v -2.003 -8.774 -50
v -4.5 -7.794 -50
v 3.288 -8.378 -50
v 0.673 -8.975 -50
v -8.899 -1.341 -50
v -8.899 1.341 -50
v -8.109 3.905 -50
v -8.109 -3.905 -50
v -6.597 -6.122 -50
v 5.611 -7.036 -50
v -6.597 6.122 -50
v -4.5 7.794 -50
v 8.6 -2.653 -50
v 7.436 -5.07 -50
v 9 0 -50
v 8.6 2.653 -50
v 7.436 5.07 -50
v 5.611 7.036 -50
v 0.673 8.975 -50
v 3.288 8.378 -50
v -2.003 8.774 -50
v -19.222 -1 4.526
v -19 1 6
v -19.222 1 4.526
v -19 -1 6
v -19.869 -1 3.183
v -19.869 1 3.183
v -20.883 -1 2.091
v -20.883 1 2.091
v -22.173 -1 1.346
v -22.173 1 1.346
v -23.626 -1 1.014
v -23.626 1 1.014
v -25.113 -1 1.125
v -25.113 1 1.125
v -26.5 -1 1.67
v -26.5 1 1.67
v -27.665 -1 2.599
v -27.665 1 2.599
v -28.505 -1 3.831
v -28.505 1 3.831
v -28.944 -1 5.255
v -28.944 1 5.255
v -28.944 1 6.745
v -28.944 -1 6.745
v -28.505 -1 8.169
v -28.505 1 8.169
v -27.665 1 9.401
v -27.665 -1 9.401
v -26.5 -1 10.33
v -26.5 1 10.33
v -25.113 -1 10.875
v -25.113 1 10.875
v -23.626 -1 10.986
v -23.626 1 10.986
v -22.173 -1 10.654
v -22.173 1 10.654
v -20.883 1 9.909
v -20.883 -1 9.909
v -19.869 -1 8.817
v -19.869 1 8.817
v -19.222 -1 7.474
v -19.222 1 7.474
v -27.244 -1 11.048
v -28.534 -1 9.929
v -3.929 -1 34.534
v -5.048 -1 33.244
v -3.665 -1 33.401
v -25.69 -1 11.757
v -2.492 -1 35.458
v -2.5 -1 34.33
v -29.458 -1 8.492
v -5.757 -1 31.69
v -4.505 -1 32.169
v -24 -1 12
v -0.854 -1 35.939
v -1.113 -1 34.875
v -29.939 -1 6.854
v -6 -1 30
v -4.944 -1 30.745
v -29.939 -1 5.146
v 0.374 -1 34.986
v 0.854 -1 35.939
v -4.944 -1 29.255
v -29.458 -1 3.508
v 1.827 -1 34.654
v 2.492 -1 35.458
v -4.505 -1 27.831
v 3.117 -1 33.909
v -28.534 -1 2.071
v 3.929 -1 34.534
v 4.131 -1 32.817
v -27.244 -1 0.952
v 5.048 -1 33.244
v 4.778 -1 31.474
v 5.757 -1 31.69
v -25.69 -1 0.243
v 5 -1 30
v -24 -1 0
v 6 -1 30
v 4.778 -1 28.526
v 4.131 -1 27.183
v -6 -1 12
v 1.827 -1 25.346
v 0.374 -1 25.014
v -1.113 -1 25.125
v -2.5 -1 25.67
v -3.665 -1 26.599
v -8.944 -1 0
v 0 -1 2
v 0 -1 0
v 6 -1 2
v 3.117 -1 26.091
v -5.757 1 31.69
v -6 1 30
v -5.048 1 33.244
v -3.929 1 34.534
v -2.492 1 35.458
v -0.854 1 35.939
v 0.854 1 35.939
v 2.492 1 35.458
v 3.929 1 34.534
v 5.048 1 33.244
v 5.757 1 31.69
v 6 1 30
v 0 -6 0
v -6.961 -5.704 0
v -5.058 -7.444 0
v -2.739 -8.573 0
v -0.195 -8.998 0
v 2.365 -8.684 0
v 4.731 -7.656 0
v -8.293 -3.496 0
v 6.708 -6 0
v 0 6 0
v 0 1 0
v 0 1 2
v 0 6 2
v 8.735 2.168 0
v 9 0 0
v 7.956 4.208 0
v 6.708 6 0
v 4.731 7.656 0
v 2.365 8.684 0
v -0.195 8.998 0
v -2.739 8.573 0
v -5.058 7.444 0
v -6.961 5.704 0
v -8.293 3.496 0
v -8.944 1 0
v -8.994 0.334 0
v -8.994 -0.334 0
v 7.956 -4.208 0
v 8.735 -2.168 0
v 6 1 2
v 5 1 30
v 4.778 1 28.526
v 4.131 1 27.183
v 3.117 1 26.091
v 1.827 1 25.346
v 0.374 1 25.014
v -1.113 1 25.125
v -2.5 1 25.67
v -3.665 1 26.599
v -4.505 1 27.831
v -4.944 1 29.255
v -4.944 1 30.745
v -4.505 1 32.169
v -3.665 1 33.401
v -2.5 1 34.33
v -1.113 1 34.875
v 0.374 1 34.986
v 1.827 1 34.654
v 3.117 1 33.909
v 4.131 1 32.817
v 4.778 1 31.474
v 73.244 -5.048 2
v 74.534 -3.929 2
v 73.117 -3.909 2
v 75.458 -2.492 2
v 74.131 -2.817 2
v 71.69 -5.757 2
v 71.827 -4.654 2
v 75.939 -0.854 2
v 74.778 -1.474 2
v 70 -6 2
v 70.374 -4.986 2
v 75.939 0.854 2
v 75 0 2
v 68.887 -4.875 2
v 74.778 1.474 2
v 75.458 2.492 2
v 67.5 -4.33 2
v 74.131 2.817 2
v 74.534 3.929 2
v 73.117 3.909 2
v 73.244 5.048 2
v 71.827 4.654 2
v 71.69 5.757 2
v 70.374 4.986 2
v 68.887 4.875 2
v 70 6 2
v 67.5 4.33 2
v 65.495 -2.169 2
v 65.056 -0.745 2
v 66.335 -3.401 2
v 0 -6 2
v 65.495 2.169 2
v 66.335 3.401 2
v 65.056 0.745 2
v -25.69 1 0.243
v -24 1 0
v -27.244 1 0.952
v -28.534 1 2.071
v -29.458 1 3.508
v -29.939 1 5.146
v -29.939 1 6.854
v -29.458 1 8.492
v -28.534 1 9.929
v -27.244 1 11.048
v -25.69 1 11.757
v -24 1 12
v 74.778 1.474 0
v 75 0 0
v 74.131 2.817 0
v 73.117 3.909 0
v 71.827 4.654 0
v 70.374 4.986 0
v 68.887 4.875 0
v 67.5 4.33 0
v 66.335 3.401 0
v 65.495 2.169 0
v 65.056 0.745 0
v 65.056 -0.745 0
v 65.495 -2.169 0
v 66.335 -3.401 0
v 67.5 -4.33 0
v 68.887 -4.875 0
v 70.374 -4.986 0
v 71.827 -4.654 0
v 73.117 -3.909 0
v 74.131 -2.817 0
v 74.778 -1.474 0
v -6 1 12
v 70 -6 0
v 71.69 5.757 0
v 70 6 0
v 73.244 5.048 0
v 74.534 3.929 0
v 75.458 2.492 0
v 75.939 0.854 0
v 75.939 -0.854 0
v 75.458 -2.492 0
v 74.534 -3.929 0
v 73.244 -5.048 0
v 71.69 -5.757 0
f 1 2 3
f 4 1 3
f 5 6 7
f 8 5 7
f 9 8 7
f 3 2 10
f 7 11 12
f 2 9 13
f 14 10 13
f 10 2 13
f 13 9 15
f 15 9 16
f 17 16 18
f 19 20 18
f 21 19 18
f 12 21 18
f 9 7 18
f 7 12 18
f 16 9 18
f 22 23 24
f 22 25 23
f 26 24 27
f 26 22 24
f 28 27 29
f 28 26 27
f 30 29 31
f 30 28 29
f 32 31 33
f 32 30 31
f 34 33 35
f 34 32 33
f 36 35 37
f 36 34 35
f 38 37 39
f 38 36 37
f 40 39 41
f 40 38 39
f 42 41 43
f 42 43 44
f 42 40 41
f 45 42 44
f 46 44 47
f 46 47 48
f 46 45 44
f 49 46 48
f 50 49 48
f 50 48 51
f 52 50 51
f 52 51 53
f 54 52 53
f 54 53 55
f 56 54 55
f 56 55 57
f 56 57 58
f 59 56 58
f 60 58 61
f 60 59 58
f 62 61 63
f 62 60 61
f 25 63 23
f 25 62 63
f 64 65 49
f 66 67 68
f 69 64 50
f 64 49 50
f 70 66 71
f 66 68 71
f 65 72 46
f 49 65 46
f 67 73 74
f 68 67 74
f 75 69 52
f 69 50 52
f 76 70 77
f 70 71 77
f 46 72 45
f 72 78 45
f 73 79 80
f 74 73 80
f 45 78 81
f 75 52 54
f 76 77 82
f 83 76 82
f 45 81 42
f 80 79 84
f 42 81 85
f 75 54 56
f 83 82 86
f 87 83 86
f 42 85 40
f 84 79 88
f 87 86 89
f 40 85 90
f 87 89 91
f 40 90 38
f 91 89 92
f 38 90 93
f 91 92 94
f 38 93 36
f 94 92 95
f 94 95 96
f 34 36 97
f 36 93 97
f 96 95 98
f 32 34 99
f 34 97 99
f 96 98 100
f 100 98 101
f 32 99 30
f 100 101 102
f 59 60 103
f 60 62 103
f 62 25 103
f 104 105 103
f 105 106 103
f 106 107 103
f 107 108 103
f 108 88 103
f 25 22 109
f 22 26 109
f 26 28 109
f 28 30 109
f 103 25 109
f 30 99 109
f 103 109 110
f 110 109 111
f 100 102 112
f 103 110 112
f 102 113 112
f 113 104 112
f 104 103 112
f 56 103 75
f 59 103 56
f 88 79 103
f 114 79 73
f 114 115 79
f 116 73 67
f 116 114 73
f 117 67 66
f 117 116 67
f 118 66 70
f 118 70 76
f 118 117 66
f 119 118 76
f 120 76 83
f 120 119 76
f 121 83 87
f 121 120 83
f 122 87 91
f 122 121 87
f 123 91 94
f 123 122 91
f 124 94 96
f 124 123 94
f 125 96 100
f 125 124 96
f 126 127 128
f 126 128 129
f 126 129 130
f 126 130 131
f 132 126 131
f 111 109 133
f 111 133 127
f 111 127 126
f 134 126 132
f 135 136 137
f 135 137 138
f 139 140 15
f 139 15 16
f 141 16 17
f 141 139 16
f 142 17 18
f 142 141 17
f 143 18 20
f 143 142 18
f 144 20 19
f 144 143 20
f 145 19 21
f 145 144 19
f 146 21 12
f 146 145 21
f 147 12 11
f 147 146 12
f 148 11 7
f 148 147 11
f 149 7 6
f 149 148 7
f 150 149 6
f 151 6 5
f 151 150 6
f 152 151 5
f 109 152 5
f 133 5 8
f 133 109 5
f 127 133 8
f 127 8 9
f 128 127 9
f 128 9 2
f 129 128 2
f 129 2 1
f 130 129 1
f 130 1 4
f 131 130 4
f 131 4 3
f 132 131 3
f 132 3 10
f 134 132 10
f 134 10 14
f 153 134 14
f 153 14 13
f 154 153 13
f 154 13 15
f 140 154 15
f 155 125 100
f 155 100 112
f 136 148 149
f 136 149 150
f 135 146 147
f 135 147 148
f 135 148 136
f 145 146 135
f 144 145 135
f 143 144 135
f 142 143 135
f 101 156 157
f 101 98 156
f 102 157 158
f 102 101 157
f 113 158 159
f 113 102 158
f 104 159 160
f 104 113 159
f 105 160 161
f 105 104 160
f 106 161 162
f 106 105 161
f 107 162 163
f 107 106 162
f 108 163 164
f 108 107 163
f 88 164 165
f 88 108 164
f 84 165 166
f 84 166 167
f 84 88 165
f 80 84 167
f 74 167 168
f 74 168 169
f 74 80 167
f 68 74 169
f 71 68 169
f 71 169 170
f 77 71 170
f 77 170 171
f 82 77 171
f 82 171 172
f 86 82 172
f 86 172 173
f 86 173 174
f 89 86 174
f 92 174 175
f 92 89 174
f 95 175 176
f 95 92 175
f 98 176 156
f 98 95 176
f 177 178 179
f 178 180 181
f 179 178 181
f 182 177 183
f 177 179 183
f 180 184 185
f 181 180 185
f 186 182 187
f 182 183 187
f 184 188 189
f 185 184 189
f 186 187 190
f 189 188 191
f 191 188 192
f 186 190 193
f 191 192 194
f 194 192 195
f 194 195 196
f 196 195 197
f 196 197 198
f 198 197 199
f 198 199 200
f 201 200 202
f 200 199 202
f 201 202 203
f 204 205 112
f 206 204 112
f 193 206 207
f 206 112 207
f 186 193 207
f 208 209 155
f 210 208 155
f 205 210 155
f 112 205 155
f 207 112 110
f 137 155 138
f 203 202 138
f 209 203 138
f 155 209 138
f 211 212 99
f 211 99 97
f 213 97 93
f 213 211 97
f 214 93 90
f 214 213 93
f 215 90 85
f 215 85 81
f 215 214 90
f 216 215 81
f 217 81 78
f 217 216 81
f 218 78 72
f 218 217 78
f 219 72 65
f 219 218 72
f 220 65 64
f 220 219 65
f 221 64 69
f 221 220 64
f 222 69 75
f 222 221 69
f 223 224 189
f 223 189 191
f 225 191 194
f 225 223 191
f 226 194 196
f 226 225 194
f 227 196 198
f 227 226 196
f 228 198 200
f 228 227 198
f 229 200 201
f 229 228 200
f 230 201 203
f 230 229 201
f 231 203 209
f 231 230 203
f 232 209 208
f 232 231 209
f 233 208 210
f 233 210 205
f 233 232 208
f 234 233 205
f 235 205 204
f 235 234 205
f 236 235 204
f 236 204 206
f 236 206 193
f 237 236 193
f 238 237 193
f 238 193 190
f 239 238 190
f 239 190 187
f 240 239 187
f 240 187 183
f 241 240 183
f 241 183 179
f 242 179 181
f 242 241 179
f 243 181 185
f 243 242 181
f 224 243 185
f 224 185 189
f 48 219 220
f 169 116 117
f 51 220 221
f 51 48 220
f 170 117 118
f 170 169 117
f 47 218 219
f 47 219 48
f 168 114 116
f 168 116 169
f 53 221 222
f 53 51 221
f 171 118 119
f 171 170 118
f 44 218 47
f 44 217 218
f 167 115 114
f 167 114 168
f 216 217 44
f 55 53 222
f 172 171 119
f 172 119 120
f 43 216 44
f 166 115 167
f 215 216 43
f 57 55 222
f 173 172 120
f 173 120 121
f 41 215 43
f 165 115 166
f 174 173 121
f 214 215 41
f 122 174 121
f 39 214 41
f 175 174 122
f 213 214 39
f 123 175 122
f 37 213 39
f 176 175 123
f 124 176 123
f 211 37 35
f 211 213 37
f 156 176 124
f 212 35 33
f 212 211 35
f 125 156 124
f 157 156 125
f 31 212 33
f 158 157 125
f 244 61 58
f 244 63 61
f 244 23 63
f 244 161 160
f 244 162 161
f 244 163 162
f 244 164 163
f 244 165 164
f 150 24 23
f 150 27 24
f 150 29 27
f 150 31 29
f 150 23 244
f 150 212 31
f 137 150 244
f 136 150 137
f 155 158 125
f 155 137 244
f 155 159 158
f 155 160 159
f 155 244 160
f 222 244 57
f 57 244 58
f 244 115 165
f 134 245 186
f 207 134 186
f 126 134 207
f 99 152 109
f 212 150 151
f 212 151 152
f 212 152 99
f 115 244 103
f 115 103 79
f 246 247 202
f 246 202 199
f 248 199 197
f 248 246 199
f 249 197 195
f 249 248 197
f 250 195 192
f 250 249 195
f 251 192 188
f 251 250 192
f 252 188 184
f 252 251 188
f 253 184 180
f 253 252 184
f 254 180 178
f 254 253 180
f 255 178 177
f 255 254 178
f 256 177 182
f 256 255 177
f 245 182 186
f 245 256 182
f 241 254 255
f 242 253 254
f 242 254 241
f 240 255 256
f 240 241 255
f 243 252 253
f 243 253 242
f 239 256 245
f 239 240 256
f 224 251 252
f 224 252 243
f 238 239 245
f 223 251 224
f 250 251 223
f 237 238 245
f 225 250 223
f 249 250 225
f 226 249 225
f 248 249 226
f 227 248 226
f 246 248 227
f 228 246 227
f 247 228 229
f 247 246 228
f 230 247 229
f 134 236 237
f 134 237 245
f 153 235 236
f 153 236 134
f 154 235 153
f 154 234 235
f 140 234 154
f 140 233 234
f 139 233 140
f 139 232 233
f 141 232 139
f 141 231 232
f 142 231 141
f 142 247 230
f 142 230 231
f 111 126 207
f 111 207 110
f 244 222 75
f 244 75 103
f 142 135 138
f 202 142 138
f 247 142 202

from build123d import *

# Parameters (mm, degrees)
SKETCH1_R           = 9
BOSS_EXTRUDE1_DEPTH = 50
SKETCH2_R           = 5
BOSS_EXTRUDE2_DEPTH = 2
SKETCH4_W           = 12
SKETCH4_H           = 12
SKETCH4_R           = 5
BOSS_EXTRUDE3_DEPTH = 1


with BuildPart() as part:
    # Sketch1 → Boss-Extrude1 (new body)
    with BuildSketch(Plane.XY):
        Circle(SKETCH1_R)
    extrude(amount=-BOSS_EXTRUDE1_DEPTH)



with BuildPart() as body_2:
    # Sketch2 → Boss-Extrude2 (new body)
    with BuildSketch(Plane.XY):
        with BuildLine():
            Line((0, 0), (0, 6))
            Line((0, 6), (70, 6))
            ThreePointArc((70, 6), (76, 0), (70, -6))
            Line((70, -6), (0, -6))
            Line((0, -6), (0, 0))
        make_face()
        with Locations((70, 0)):
            Circle(SKETCH2_R, mode=Mode.SUBTRACT)
    extrude(amount=BOSS_EXTRUDE2_DEPTH)


with BuildPart() as part_1:
    add(part.part)

    add(body_2.part)  # Boss-Extrude3 merges body 2
    # Sketch4 → Boss-Extrude3 (add, symmetric)
    with BuildSketch(Plane(origin=(0, 0, 0), x_dir=(1, 0, 0), z_dir=(0, 1, 0))):
        with Locations((0, -6)):
            Rectangle(SKETCH4_W, SKETCH4_H)
        with BuildLine():
            Line((-6, -12), (-6, 0))
            Line((-6, 0), (-24, 0))
            ThreePointArc((-24, 0), (-30, -6), (-24, -12))
            Line((-24, -12), (-6, -12))
        make_face()
        with Locations((-24, -6)):
            Circle(SKETCH4_R, mode=Mode.SUBTRACT)
        with BuildLine():
            Line((6, -12), (-6, -12))
            Line((-6, -12), (-6, -30))
            ThreePointArc((-6, -30), (0, -36), (6, -30))
            Line((6, -30), (6, -12))
        make_face()
        with Locations((0, -30)):
            Circle(SKETCH4_R, mode=Mode.SUBTRACT)
    extrude(amount=BOSS_EXTRUDE3_DEPTH, both=True)


solid = part_1.part
